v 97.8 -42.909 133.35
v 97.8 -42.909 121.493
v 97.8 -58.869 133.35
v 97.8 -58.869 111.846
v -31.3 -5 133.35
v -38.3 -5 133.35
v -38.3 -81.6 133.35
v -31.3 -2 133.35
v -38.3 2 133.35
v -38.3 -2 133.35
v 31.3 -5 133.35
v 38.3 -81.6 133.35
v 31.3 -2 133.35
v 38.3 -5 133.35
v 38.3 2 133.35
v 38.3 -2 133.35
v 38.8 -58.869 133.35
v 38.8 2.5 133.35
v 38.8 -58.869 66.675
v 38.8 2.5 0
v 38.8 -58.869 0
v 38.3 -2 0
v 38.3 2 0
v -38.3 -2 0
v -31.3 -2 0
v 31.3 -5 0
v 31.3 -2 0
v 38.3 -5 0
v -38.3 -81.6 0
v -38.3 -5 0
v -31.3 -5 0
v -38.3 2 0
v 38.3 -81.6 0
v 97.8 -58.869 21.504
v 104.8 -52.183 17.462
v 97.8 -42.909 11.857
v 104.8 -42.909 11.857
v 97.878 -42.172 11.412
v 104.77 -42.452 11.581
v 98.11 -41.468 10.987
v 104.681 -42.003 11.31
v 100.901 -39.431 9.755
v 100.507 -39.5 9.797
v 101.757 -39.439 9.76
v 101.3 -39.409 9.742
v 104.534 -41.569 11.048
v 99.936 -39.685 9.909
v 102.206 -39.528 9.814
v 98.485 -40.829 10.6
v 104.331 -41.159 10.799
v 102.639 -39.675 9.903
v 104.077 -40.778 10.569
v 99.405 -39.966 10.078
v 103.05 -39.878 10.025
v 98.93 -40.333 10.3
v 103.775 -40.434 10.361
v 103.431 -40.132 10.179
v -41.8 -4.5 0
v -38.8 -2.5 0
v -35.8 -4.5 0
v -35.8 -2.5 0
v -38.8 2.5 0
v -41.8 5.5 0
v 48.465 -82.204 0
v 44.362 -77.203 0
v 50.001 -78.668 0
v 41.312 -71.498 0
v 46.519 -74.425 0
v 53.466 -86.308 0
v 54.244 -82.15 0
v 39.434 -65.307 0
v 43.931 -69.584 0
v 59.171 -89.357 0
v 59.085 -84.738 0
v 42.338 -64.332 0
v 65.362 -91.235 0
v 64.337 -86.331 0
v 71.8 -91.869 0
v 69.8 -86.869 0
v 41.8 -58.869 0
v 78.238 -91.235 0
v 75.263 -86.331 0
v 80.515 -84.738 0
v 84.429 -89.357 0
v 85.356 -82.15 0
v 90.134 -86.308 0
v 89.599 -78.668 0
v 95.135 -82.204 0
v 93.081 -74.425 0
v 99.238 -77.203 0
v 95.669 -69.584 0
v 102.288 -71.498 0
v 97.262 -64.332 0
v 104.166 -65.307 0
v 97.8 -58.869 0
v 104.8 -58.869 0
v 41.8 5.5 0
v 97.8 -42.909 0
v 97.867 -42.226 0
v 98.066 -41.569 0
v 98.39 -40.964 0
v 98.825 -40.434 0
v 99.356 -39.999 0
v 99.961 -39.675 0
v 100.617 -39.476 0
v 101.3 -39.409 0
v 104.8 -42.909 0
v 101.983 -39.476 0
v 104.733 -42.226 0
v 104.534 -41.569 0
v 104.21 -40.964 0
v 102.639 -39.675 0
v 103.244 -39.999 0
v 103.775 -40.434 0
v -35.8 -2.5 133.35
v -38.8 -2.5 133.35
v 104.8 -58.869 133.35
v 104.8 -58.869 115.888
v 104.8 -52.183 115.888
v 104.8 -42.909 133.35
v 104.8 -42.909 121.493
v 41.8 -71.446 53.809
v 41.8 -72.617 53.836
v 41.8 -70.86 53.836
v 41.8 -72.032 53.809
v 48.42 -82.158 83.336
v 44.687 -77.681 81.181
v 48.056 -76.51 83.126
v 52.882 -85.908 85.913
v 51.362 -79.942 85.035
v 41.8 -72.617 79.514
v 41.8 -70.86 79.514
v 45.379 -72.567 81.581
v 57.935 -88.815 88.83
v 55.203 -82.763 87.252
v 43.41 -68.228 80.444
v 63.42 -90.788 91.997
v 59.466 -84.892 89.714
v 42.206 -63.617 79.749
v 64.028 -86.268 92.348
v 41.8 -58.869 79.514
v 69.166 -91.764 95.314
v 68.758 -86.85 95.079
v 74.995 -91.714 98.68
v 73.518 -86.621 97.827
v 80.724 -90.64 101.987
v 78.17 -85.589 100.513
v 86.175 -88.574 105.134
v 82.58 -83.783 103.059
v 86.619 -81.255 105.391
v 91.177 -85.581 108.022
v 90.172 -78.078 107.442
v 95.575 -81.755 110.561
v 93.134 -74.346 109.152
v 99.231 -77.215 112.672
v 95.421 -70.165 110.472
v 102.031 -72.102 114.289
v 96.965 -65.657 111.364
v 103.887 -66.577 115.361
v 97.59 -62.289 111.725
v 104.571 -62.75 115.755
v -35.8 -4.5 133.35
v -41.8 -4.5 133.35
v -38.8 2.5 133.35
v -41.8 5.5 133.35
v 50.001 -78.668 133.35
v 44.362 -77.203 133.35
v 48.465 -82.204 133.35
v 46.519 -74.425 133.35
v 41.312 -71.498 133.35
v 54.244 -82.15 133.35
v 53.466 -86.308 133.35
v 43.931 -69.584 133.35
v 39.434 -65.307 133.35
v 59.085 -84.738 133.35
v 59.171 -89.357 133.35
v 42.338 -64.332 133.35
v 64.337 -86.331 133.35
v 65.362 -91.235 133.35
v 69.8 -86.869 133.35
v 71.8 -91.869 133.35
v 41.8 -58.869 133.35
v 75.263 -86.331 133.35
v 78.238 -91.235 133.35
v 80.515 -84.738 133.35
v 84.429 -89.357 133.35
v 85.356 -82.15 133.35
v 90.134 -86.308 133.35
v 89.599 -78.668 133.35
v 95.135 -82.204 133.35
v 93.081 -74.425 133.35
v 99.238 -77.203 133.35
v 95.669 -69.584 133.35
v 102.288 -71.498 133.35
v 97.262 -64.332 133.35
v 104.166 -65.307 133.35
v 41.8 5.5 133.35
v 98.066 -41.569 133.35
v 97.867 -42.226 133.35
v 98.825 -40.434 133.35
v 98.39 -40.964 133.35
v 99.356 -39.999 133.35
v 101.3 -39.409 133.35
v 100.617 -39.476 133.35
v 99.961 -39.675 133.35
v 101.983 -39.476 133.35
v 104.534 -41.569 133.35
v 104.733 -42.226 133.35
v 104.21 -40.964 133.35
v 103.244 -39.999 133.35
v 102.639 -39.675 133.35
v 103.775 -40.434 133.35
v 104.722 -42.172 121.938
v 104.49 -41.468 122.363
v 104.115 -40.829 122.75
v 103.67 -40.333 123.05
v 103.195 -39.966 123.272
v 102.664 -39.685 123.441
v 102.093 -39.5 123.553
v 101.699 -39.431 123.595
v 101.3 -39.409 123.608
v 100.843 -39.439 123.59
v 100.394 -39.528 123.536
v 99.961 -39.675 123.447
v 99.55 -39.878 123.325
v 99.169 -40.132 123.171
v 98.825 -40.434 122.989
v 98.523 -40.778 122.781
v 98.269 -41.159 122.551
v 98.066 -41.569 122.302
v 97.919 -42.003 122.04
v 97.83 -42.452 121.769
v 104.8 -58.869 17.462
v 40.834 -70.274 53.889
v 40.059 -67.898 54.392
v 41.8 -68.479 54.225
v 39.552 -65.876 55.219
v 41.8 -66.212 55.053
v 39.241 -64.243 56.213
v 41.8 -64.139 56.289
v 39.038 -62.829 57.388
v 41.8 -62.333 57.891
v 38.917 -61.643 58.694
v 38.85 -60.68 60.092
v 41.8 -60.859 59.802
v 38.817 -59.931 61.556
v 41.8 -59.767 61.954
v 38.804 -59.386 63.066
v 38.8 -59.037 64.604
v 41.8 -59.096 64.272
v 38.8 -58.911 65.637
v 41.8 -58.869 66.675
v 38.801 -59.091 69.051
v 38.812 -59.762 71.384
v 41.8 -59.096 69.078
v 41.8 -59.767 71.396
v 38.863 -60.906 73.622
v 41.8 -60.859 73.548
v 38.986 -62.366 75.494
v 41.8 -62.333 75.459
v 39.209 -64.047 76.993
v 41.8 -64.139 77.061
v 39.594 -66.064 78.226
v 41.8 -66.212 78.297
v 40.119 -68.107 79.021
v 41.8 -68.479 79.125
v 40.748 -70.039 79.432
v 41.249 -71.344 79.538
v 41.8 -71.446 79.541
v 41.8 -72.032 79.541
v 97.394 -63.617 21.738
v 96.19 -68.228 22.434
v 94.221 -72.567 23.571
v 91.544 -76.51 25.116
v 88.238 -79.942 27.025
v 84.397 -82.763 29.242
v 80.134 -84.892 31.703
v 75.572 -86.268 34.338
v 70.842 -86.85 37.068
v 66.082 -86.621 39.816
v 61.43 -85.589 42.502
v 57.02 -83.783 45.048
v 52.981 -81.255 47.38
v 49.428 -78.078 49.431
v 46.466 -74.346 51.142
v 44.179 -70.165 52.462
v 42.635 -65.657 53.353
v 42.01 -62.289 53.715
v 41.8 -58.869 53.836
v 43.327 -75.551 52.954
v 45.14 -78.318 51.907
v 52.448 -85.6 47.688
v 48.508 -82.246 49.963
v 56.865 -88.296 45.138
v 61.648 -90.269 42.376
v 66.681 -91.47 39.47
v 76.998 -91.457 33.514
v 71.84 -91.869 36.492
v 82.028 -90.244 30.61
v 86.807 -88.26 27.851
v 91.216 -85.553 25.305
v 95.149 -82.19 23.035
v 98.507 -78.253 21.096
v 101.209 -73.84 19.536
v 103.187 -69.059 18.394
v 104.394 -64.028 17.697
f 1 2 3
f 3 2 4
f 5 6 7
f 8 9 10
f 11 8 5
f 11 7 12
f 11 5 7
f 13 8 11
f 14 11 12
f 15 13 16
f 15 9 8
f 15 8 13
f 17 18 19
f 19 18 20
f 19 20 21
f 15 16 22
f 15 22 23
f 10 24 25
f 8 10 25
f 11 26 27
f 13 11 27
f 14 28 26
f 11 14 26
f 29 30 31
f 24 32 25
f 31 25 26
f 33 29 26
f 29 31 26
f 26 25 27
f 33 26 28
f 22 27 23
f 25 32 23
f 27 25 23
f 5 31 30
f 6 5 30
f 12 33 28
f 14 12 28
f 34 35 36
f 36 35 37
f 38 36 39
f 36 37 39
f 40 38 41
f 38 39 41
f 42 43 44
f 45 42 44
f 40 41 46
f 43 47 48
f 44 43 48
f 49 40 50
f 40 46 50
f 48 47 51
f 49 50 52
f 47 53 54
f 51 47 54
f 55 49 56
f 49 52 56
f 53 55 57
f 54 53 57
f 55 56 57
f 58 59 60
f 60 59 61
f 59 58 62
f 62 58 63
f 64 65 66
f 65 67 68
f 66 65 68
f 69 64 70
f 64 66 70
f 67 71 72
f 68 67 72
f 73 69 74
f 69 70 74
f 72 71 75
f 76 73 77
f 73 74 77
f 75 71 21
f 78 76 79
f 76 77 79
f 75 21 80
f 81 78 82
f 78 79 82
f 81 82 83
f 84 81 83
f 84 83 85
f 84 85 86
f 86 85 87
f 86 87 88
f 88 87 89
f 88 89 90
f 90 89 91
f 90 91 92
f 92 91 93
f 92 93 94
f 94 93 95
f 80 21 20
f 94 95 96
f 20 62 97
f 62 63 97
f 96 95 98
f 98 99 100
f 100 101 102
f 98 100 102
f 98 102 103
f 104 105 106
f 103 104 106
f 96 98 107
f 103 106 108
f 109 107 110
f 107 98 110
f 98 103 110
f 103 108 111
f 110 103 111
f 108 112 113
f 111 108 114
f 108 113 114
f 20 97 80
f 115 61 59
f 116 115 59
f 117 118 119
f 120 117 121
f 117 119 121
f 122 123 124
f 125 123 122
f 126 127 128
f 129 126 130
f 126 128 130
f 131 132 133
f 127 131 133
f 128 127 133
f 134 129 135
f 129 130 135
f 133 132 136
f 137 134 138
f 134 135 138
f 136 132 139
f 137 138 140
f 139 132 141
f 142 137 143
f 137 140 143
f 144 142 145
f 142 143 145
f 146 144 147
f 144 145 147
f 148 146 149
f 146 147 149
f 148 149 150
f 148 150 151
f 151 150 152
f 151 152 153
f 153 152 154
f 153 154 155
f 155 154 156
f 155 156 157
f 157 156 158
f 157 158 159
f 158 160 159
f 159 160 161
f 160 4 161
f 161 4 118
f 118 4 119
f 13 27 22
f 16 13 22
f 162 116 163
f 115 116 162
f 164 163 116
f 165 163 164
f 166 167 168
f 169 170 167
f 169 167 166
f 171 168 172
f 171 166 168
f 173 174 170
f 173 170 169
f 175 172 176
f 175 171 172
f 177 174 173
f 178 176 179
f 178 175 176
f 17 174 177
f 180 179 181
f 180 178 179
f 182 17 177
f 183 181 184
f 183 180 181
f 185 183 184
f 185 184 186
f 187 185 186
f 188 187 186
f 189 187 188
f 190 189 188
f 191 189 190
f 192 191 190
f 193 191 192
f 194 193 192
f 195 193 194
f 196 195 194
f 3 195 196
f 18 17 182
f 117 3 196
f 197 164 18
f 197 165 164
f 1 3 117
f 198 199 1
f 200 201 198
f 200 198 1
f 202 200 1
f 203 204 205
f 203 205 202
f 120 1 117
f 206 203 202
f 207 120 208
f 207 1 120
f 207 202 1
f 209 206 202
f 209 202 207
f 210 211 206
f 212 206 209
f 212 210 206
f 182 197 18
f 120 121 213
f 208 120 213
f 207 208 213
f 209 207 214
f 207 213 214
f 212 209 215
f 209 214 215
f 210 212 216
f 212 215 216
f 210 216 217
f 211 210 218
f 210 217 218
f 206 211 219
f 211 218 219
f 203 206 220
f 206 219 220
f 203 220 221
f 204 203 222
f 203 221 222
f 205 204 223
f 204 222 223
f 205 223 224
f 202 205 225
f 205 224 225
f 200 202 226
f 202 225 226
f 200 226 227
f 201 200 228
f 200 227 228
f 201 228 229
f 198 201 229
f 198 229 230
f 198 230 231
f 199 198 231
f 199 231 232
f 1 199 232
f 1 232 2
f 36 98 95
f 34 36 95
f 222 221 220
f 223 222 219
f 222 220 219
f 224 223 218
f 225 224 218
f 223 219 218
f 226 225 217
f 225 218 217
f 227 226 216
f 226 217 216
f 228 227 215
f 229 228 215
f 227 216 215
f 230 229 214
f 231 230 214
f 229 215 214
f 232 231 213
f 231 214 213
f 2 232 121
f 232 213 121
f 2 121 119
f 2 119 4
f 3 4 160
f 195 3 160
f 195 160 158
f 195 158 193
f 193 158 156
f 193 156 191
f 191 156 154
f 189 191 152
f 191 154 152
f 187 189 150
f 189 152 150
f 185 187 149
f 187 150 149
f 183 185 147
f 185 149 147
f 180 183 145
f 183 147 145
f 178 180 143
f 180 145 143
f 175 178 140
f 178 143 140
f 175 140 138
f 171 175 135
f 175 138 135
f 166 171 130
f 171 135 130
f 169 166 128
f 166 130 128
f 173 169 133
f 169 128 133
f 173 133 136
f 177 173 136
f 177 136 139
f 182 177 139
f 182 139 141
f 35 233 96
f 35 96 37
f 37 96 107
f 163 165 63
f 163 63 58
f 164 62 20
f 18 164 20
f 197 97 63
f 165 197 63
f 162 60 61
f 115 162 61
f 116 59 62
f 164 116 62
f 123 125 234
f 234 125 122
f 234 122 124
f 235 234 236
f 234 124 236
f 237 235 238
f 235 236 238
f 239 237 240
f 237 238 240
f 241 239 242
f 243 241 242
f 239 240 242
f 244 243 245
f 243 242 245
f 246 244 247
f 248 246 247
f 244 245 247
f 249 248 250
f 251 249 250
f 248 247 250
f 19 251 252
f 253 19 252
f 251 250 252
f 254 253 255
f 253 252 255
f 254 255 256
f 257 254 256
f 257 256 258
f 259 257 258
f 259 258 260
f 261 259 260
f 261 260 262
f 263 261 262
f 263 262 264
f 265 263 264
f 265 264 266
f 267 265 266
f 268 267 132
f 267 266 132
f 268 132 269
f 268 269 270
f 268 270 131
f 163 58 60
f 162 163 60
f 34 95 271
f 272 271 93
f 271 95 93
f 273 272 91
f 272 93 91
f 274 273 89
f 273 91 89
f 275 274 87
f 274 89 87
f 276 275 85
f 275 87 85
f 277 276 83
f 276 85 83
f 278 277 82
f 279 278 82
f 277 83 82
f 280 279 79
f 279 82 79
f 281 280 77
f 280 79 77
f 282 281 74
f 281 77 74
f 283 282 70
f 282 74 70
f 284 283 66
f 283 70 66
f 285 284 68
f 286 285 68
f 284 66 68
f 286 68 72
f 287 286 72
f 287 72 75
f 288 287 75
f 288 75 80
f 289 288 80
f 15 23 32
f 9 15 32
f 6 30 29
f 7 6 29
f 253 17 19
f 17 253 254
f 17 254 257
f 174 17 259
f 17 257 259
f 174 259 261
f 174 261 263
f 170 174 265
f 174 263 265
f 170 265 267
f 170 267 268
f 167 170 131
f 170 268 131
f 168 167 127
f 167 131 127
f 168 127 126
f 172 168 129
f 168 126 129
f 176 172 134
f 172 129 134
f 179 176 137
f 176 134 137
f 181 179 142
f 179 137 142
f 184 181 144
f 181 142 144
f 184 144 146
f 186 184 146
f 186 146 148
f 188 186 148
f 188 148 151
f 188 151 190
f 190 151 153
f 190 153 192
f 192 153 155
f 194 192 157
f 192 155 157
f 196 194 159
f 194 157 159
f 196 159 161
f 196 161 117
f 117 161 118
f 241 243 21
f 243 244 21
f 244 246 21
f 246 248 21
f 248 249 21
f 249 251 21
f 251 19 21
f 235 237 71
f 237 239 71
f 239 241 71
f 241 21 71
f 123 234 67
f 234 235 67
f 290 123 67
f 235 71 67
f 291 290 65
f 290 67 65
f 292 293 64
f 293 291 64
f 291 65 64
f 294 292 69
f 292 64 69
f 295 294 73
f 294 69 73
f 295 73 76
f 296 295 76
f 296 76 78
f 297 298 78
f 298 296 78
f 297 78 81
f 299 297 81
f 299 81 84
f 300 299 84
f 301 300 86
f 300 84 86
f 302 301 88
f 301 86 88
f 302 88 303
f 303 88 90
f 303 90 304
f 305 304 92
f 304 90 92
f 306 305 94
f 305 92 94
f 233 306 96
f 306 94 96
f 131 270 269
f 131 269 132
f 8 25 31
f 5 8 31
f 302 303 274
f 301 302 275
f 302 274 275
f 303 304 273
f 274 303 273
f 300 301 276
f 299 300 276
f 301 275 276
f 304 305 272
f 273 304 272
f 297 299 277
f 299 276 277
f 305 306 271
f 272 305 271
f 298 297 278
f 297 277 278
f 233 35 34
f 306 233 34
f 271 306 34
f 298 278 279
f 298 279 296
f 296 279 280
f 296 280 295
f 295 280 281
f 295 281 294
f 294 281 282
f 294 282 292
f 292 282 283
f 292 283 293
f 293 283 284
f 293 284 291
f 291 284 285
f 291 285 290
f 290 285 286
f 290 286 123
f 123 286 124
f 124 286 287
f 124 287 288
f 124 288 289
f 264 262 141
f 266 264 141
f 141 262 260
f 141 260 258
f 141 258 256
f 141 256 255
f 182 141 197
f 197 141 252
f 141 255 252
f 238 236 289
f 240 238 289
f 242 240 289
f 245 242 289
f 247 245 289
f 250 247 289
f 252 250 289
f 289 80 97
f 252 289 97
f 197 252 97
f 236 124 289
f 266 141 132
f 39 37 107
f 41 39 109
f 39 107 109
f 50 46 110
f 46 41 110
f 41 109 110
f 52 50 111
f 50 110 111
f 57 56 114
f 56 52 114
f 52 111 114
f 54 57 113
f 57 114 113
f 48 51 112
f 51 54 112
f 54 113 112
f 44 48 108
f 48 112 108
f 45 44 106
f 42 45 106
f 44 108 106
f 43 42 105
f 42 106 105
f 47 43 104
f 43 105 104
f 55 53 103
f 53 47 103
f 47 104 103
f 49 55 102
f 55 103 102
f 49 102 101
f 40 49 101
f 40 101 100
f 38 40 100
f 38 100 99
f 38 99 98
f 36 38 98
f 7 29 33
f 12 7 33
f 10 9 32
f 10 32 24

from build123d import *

# Parameters (mm, degrees)
F3_DEPTH = 133.35
F5_DEPTH = 97.3703234473
F7_DEPTH = 83.601
F9_DEPTH = 63


with BuildPart() as f3:
    # F1 (on Top) → F3 (new body)
    with BuildSketch(Plane.XY):
        Polygon((38.3, -2), (38.3, 2), (-38.3, 2), (-38.3, -2), (-31.3, -1.9999996343), (-31.3, -4.9999996343), (-38.3, -4.9999996343), (-38.3, -81.5999996343), (38.3, -81.5999996343), (38.3, -4.9999996343), (31.3, -4.9999996343), (31.3, -1.9999996343), align=None)
    extrude(amount=F3_DEPTH)


with BuildPart() as f3b:
    # F2 (on Top) → F3, piece 2 (new body)
    with BuildSketch(Plane.XY):
        with BuildLine():
            Line((-41.8, -4.4999996343), (-35.8, -4.4999996343))
            Line((-35.8, -4.4999996343), (-35.8, -2.5000000261))
            Line((-35.8, -2.5000000261), (-38.8, -2.5000000261))
            Line((-38.8, -2.5000000261), (-38.8, 2.5))
            Line((-38.8, 2.5), (38.8, 2.5))
            Line((38.8, 2.5), (38.8, -58.8693234473))
            ThreePointArc((38.8, -58.8693234473), (71.8, -91.8693234473), (104.8, -58.8693234473))
            Line((104.8, -58.8693234473), (104.8, -42.9086722434))
            ThreePointArc((104.8, -42.9086722434), (101.3, -39.4086722434), (97.8, -42.9086722434))
            Line((97.8, -42.9086722434), (97.8, -58.8693234473))
            ThreePointArc((97.8, -58.8693234473), (69.8, -86.8693234473), (41.8, -58.8693234473))
            Line((41.8, -58.8693234473), (41.8, 5.5))
            Line((41.8, 5.5), (-41.8, 5.5))
            Line((-41.8, 5.5), (-41.8, -4.4999996343))
        make_face()
    extrude(amount=F3_DEPTH)

    # F4 (on face) → F5 (cut, through all)
    with BuildSketch(Plane(origin=(0, 5.5, 0), x_dir=(-1, 0, 0), z_dir=(0, 1, 0))):
        Polygon((-41.8, 79.5144330411), (-104.8, 115.8875), (-104.8, 17.4625), (-41.8, 53.8355669589), align=None)
    extrude(amount=-F5_DEPTH, mode=Mode.SUBTRACT)

    # F6 (on face) → F7 (cut, through all)
    with BuildSketch(Plane.YZ.offset(41.8)):
        with BuildLine():
            Line((-72.6170505322, 79.5144330411), (-72.6170505322, 53.8355669589))
            ThreePointArc((-72.6170505322, 53.8355669589), (-58.8693234473, 66.675), (-72.6170505322, 79.5144330411))
        make_face()
    extrude(amount=-F7_DEPTH, mode=Mode.SUBTRACT)

    # F8 (on face) → F9 (cut, through all)
    with BuildSketch(Plane.YZ.offset(104.8)):
        Polygon((-39.4086722434, 113.8667740578), (-39.4086722434, 123.6083870289), (-58.8693234473, 111.8460481157), (-39.4086722434, 111.8460481157), align=None)
        Polygon((-58.8693234473, 21.5039518843), (-39.4086722434, 9.7416129711), (-39.4086722434, 19.4832259422), (-39.4086722434, 21.5039518843), align=None)
    extrude(amount=-F9_DEPTH, mode=Mode.SUBTRACT)


solid = Compound([f3.part, f3b.part])
